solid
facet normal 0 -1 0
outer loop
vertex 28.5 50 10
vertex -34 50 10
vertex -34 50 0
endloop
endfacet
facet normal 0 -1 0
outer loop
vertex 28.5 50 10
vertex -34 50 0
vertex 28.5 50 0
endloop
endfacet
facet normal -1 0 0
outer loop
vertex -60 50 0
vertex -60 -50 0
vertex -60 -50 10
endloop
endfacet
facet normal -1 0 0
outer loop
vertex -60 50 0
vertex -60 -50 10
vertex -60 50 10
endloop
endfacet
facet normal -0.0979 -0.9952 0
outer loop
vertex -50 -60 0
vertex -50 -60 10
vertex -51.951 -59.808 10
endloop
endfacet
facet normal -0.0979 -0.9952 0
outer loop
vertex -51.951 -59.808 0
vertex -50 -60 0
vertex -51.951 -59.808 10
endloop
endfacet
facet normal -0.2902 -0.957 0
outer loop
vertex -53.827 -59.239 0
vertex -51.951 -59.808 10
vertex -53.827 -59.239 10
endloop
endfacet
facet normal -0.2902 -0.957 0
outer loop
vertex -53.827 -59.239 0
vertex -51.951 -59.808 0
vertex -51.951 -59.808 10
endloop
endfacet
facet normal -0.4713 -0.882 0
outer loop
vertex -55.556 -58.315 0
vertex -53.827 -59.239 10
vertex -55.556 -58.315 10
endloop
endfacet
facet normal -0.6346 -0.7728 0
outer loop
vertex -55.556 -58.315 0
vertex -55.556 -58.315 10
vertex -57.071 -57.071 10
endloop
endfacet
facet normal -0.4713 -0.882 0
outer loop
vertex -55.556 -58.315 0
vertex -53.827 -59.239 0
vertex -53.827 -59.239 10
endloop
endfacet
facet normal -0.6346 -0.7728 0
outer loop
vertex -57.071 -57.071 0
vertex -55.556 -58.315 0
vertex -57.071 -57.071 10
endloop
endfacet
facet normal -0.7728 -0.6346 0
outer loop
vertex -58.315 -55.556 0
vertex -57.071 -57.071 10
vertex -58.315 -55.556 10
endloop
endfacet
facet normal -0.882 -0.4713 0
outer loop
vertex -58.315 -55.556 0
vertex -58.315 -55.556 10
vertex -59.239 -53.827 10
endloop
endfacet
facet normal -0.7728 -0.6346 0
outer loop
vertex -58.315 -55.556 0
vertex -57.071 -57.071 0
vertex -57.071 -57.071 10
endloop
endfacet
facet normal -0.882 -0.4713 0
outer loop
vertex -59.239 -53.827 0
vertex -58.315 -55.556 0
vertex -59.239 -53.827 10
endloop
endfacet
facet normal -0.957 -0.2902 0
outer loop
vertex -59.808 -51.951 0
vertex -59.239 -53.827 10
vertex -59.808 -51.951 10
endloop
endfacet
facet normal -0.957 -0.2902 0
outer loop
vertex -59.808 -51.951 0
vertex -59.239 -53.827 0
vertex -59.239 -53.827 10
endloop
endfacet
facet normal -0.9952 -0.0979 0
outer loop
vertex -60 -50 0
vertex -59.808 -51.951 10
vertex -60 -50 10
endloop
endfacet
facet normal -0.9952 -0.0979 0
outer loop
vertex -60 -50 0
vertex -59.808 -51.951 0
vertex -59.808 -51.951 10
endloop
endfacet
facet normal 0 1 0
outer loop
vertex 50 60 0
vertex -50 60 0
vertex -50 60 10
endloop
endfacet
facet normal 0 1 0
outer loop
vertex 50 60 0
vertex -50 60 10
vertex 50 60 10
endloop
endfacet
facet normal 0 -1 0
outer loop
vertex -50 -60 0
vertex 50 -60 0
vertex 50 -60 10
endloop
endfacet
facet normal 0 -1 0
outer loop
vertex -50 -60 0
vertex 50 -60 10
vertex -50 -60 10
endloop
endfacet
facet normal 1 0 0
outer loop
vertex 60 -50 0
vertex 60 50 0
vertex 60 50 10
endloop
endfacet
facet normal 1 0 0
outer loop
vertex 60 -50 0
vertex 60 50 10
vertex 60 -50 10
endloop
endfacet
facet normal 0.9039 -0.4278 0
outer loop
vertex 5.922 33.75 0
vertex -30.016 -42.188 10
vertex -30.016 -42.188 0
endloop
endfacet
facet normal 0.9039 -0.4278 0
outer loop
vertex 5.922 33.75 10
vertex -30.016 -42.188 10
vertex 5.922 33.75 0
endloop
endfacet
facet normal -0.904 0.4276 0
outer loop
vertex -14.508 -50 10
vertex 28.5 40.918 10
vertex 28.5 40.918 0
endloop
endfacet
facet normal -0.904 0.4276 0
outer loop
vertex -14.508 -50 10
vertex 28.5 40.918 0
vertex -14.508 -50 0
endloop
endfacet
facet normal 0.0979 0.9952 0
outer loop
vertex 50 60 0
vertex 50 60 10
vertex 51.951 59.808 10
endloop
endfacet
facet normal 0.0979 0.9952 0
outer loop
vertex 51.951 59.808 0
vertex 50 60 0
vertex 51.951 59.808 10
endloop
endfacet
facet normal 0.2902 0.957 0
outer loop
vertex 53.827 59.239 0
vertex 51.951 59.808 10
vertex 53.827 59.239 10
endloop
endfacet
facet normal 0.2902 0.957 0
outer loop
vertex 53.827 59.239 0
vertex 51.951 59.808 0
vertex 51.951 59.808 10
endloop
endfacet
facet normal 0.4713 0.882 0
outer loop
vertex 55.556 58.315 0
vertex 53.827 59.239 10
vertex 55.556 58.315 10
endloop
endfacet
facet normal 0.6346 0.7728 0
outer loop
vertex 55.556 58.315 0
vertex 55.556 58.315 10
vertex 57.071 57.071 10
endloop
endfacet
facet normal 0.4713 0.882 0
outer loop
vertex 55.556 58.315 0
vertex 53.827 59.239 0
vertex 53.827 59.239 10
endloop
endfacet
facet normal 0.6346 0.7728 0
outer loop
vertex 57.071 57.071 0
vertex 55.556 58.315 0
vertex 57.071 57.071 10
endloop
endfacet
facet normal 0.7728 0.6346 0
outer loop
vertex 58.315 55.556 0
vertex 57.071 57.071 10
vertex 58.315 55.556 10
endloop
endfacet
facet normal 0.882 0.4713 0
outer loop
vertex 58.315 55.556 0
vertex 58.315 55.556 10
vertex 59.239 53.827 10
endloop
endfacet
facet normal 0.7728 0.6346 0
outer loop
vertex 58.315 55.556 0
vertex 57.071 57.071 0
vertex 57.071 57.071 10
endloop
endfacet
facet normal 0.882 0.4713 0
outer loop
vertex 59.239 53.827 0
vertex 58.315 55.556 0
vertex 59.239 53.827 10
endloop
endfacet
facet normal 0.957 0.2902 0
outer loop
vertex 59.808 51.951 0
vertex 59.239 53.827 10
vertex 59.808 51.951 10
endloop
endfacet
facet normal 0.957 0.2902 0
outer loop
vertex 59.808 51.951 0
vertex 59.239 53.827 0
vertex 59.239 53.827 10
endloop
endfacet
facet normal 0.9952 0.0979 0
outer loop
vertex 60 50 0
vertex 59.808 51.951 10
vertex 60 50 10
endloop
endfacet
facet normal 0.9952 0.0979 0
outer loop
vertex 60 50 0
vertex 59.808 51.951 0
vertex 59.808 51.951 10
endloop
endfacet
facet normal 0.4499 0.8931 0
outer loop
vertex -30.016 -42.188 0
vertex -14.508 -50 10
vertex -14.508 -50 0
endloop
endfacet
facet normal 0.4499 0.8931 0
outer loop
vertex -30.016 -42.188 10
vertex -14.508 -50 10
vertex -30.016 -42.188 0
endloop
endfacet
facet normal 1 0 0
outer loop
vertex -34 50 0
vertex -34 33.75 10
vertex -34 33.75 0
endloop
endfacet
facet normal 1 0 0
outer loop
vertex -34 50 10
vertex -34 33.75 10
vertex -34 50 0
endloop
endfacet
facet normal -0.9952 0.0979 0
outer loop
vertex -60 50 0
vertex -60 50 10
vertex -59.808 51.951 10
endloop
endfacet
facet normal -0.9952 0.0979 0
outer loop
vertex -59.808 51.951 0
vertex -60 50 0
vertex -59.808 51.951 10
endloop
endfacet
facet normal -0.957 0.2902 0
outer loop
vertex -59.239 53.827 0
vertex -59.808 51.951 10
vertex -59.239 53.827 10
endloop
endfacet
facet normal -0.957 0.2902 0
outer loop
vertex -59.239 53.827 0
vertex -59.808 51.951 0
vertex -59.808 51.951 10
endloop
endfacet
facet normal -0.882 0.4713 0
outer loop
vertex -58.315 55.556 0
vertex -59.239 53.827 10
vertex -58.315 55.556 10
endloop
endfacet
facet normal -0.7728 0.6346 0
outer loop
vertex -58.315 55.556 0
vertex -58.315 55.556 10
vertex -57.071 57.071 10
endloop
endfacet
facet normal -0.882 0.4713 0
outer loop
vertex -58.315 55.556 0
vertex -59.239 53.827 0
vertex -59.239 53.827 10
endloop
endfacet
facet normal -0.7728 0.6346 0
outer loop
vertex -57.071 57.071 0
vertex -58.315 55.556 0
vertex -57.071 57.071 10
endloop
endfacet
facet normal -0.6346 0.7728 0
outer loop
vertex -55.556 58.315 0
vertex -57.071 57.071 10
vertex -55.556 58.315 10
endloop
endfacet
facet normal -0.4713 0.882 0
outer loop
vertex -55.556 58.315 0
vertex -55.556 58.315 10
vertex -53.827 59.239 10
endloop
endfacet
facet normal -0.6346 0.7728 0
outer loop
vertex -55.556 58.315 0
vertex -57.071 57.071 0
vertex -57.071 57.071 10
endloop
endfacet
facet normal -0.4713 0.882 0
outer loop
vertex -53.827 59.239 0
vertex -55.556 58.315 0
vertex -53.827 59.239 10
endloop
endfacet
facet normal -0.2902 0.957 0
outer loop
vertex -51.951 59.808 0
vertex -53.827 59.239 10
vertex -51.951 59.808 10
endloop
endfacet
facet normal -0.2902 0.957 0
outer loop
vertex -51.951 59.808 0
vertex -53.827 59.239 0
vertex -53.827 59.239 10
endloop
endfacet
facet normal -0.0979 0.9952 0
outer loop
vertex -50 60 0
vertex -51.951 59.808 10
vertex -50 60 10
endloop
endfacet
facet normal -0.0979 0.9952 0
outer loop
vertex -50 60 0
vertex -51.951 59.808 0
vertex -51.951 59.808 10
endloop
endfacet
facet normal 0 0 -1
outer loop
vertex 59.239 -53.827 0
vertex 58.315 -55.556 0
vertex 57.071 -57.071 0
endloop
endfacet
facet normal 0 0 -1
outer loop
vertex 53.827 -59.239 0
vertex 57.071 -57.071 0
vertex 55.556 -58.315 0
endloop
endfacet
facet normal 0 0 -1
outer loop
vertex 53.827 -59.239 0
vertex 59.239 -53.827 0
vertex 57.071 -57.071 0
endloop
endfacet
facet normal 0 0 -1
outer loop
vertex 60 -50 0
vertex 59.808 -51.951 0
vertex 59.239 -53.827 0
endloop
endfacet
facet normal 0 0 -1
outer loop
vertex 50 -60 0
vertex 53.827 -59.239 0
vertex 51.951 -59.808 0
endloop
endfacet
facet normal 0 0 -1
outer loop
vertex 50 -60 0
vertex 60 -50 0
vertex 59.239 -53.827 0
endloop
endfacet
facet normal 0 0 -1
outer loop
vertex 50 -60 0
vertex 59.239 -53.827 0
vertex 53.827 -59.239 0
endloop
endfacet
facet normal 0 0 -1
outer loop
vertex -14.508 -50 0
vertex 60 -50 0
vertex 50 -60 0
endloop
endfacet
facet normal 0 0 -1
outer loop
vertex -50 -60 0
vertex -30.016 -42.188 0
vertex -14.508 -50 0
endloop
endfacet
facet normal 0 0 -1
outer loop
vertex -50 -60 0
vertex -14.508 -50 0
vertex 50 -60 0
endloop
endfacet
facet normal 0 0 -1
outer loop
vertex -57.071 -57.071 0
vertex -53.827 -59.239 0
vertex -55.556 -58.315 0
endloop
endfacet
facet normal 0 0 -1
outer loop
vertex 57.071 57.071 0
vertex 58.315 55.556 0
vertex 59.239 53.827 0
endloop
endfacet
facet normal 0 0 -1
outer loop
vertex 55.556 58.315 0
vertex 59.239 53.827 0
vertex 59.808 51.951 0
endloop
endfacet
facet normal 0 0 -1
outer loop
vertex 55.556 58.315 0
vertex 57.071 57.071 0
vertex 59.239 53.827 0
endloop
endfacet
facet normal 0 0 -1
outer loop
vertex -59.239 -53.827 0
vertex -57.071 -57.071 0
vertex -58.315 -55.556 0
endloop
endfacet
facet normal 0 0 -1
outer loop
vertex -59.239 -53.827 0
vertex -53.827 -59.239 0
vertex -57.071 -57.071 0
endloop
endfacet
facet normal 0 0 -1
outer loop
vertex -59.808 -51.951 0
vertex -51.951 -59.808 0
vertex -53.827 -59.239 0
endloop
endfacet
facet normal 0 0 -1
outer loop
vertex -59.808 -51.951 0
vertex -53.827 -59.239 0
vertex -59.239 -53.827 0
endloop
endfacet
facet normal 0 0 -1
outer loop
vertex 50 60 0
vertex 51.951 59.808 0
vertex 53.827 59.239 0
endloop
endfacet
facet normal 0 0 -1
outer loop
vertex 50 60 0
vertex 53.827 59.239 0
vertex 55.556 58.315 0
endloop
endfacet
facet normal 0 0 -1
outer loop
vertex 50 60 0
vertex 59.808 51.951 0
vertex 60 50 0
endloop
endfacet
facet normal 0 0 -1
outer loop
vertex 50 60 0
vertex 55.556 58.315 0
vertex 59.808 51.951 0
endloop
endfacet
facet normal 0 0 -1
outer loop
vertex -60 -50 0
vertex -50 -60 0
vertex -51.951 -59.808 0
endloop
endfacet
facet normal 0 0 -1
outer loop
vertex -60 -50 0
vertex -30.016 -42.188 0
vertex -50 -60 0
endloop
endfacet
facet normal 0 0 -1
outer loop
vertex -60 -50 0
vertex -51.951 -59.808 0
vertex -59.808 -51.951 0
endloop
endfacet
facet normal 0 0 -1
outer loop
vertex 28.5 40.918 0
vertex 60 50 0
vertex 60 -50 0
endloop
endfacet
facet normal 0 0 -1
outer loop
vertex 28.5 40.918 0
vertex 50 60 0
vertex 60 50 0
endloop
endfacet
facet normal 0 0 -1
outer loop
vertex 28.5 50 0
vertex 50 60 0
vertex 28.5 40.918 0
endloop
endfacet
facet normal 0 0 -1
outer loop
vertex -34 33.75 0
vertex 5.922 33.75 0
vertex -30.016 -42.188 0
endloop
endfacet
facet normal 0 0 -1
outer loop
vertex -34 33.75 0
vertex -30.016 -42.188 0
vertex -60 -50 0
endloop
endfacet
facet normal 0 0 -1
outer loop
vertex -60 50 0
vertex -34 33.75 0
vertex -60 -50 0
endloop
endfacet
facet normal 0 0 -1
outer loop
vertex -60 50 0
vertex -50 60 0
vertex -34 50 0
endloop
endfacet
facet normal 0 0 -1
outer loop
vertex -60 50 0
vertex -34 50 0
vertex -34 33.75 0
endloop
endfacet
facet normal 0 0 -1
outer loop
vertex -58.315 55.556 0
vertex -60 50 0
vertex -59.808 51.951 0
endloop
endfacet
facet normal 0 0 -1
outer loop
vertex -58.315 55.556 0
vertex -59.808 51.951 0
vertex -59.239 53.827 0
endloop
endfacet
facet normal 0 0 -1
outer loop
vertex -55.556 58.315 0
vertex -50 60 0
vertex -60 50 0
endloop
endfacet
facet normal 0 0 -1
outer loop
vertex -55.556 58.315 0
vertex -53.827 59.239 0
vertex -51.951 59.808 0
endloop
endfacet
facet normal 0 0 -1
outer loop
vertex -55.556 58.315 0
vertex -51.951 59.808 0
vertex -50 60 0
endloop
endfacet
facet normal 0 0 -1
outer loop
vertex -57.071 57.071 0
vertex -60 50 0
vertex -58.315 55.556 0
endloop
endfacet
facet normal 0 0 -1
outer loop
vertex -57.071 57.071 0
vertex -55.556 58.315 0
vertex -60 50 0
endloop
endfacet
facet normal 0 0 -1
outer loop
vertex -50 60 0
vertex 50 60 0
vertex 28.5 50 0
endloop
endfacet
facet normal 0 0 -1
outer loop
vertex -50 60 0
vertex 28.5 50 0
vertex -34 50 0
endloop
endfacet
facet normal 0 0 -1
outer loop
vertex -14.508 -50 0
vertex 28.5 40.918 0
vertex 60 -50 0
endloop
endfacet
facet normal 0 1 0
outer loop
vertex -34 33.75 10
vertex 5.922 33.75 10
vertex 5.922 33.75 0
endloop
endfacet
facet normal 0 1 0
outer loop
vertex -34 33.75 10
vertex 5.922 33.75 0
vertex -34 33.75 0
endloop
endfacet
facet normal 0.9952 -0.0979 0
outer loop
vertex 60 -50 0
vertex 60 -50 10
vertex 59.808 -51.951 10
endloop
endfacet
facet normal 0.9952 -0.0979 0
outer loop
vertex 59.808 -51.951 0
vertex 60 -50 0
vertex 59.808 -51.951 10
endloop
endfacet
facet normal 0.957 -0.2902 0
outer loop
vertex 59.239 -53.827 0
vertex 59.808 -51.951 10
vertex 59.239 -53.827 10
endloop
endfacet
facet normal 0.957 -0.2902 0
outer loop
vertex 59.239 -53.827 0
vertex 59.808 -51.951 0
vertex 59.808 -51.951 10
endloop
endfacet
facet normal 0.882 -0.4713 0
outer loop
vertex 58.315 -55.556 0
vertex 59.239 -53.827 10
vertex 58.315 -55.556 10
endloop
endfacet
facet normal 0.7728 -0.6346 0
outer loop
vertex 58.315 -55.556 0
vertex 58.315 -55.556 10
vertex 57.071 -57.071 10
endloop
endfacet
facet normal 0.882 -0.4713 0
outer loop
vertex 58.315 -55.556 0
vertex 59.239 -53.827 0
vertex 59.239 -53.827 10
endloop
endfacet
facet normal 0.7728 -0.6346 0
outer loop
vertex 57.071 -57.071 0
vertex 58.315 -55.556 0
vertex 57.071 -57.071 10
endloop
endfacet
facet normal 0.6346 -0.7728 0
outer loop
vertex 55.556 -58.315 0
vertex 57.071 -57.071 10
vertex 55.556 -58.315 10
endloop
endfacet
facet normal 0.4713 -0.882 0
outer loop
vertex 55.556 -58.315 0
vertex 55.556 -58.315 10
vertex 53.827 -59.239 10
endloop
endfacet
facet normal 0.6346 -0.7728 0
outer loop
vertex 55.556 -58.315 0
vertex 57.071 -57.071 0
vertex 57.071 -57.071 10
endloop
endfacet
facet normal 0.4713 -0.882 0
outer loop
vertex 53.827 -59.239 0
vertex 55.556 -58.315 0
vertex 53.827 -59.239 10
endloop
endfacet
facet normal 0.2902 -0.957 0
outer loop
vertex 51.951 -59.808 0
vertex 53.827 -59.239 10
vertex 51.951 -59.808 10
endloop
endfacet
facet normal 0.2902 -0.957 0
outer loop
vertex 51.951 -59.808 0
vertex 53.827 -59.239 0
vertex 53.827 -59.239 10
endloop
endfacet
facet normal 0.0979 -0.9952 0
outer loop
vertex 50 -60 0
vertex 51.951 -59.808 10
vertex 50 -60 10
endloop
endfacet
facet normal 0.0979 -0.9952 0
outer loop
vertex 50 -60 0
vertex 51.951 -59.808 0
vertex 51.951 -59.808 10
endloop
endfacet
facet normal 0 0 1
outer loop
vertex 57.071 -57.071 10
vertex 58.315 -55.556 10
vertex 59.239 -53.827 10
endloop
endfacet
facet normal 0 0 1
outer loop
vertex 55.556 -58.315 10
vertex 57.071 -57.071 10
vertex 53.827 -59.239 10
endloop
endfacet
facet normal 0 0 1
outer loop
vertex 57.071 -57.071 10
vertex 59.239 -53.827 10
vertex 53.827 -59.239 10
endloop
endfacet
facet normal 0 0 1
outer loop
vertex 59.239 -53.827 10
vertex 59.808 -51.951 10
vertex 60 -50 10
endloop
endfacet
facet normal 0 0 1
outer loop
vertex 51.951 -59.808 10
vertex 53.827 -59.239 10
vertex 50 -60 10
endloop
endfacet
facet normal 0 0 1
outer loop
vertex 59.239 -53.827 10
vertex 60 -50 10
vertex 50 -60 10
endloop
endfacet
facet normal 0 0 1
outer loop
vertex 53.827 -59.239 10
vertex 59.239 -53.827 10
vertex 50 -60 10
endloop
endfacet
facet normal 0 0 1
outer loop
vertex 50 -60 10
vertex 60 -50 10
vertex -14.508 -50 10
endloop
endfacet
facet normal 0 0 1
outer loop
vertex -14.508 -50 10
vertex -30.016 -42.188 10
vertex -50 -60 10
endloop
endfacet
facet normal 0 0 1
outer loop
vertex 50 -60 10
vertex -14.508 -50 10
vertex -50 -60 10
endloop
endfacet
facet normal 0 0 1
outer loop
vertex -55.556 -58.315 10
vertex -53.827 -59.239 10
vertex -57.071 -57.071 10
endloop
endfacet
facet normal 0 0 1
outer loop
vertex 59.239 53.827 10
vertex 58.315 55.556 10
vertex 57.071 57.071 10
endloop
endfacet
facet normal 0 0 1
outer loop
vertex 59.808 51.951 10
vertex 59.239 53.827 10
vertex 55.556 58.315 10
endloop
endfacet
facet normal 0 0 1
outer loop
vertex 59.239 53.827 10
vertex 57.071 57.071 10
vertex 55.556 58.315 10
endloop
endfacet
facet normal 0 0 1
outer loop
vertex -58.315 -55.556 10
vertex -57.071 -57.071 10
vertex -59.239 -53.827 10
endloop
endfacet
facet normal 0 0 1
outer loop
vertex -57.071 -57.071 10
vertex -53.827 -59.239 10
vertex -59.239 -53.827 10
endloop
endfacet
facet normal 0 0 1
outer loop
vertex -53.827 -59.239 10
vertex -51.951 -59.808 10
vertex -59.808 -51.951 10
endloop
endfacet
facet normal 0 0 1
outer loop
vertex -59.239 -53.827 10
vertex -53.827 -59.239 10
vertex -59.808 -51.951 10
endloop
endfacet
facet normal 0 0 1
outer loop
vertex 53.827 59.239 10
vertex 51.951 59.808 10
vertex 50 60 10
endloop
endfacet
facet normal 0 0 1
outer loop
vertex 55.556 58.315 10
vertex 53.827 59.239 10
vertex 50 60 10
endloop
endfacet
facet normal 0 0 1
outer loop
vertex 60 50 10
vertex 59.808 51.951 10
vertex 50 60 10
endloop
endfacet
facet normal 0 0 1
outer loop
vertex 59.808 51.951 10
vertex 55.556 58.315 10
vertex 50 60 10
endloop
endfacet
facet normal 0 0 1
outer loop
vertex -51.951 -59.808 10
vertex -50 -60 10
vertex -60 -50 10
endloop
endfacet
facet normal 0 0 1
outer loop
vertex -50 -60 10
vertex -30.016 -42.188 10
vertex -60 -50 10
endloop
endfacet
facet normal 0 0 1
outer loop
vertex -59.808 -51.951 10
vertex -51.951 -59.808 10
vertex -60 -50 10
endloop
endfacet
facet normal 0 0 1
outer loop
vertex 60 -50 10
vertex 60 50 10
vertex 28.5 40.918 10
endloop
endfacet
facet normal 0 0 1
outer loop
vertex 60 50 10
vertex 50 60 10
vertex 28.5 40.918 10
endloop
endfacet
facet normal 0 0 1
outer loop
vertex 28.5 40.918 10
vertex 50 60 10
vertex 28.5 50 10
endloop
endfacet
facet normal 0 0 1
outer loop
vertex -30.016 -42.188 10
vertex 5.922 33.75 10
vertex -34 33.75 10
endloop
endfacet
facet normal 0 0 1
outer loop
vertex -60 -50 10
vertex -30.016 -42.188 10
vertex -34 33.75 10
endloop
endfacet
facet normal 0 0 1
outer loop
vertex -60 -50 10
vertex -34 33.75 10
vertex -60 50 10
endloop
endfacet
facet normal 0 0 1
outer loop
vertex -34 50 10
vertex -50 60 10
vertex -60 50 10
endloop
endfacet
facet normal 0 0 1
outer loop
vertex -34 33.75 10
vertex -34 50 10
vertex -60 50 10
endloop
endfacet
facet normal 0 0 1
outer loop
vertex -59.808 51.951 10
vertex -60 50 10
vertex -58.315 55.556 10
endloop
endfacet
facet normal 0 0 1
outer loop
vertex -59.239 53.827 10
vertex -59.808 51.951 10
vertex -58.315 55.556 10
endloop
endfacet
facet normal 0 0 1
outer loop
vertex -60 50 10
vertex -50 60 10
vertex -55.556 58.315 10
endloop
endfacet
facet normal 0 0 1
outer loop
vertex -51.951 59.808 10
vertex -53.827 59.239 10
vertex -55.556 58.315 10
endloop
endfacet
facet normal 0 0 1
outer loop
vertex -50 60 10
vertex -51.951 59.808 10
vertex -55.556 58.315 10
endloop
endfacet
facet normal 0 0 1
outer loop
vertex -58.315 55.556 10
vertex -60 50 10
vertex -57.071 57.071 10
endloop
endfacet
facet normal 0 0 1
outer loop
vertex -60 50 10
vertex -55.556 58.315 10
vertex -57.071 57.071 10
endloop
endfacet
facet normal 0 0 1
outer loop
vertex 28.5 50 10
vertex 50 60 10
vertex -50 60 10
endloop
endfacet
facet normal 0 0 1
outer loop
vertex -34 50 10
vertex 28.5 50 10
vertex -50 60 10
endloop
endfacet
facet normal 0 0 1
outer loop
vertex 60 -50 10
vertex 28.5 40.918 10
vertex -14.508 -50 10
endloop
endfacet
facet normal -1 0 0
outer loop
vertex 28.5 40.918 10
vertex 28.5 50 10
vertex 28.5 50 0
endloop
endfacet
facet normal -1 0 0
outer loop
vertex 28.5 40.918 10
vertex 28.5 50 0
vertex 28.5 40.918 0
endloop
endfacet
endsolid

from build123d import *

# Parameters (mm, degrees)
BOSS_EXTRUDE1_DEPTH = 10
CUT_EXTRUDE6_DEPTH  = 10


with BuildPart() as part:
    # Sketch1 → Boss-Extrude1 (new body)
    with BuildSketch(Plane.XY):
        with BuildLine():
            Line((-50, 60), (50, 60))
            ThreePointArc((50, 60), (57.071067812, 57.071067812), (60, 50))
            Line((60, 50), (60, -50))
            ThreePointArc((60, -50), (57.071067812, -57.071067812), (50, -60))
            Line((50, -60), (-50, -60))
            ThreePointArc((-50, -60), (-57.071067812, -57.071067812), (-60, -50))
            Line((-60, -50), (-60, 50))
            ThreePointArc((-60, 50), (-57.071067812, 57.071067812), (-50, 60))
        make_face()
    extrude(amount=BOSS_EXTRUDE1_DEPTH)

    # Sketch2 → Cut-Extrude6 (cut)
    with BuildSketch(Plane.XY.offset(10)):
        Polygon((-34, 50), (28.5, 50), (28.5, 40.91796875), (-14.5078125, -50), (-30.015625, -42.1875), (5.921875, 33.75), (-34, 33.75), align=None)
    extrude(amount=-CUT_EXTRUDE6_DEPTH, mode=Mode.SUBTRACT)


solid = part.part
